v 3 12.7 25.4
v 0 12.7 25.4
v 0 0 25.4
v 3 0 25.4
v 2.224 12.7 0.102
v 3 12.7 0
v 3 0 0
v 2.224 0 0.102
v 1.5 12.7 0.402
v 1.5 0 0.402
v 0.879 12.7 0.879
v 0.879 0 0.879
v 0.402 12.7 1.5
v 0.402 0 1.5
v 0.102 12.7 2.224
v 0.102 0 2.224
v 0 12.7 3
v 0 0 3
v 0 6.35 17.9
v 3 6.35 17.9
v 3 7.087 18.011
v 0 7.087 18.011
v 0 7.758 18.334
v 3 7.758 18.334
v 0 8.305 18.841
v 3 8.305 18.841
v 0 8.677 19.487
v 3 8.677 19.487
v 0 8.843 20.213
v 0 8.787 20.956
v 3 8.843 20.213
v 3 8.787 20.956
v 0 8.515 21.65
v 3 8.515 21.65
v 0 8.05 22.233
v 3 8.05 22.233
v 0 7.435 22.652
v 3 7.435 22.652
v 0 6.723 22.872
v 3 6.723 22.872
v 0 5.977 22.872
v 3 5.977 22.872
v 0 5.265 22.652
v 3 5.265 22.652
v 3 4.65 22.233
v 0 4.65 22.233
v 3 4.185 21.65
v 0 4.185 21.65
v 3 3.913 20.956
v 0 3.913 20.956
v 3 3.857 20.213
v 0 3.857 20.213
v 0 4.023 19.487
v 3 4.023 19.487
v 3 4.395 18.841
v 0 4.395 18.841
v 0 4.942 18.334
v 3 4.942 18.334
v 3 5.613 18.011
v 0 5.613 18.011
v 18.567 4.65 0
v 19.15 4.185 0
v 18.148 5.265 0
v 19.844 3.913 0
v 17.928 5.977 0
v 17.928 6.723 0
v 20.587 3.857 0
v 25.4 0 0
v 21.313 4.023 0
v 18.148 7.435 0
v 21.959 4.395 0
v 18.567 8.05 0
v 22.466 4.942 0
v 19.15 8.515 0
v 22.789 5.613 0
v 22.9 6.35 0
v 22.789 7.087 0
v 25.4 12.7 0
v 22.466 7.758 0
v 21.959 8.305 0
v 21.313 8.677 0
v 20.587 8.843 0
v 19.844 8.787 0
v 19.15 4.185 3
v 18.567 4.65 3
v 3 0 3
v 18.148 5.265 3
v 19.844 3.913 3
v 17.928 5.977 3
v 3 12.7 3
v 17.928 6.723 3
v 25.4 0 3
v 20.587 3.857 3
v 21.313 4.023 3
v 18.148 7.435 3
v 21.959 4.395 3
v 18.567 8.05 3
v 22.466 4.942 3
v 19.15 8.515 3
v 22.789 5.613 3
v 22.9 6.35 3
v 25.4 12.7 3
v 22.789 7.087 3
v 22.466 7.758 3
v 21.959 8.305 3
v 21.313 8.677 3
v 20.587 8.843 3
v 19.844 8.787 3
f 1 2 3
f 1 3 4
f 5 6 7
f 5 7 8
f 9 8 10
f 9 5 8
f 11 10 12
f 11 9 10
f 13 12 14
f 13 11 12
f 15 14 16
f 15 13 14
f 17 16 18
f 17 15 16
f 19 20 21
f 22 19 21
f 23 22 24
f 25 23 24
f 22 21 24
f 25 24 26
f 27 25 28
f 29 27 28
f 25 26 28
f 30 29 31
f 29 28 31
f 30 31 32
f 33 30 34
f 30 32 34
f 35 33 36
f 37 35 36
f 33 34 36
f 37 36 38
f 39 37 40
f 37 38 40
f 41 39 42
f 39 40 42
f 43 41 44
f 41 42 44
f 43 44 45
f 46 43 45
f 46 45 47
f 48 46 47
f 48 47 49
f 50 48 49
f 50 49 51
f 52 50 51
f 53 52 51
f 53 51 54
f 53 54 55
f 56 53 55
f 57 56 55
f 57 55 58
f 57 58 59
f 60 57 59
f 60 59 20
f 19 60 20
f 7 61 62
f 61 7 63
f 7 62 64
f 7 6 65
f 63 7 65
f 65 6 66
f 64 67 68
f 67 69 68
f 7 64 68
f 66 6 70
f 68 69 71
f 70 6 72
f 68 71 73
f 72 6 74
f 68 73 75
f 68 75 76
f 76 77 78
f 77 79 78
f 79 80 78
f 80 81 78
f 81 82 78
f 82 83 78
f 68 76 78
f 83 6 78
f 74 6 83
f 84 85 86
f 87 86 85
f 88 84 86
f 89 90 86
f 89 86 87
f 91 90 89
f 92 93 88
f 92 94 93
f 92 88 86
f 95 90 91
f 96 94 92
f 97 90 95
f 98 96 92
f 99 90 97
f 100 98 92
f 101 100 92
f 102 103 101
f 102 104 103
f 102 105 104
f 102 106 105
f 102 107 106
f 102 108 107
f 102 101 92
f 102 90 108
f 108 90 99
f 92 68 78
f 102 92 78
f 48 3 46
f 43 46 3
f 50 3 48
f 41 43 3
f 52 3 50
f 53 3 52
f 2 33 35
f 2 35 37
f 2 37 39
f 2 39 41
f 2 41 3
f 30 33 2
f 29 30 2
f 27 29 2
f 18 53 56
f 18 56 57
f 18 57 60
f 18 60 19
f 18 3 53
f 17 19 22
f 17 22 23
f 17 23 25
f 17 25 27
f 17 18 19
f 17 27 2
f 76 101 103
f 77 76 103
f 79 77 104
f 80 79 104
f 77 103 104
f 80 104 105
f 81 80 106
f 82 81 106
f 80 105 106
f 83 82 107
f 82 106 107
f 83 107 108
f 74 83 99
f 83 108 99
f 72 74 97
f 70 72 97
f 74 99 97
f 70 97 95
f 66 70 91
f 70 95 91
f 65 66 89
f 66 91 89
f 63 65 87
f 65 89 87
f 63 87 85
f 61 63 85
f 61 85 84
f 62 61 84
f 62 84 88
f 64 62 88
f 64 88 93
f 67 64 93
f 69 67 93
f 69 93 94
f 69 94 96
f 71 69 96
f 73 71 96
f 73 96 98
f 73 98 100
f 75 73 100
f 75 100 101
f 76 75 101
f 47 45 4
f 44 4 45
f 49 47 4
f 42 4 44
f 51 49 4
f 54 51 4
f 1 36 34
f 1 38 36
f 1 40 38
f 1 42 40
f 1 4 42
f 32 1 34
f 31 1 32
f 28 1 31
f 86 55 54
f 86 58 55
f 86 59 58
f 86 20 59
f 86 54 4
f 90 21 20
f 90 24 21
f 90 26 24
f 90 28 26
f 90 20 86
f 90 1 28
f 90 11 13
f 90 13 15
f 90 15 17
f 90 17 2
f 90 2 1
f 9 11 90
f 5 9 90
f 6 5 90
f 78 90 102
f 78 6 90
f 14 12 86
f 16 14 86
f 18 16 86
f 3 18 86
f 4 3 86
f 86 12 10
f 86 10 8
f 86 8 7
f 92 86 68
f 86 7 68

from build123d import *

# Parameters (mm, degrees)
CROQUIS1_W              = 25.4
CROQUIS1_H              = 12.7
SALIENTE_EXTRUIR1_DEPTH = 40
CROQUIS2_W              = 40.869814695
CROQUIS2_H              = 51.393723527
CORTAR_EXTRUIR1_DEPTH   = 30
CROQUIS3_R              = 2.5
CORTAR_EXTRUIR2_DEPTH   = 30
CROQUIS4_R              = 2.5
CORTAR_EXTRUIR3_DEPTH   = 30


with BuildPart() as part:
    # Croquis1 → Saliente-Extruir1 (new body)
    with BuildSketch(Plane.XY):
        with Locations((12.7, 6.35)):
            Rectangle(CROQUIS1_W, CROQUIS1_H)
    extrude(amount=SALIENTE_EXTRUIR1_DEPTH)

    # Croquis2 → Cortar-Extruir1 (cut)
    with BuildSketch(Plane(origin=(0, 12.7, 0), x_dir=(1, 0, 0), z_dir=(0, 1, 0))):
        with Locations((12.097003992, -18.212370052)):
            Rectangle(CROQUIS2_W, CROQUIS2_H)
        with BuildLine():
            Line((25.4, 0), (3, 0))
            ThreePointArc((3, 0), (0.878679656, -0.878679656), (0, -3))
            Line((0, -3), (0, -25.4))
            Line((0, -25.4), (3, -25.4))
            Line((3, -25.4), (3, -3))
            Line((3, -3), (25.4, -3))
            Line((25.4, -3), (25.4, 0))
        make_face(mode=Mode.SUBTRACT)
    extrude(amount=-CORTAR_EXTRUIR1_DEPTH, mode=Mode.SUBTRACT)

    # Croquis3 → Cortar-Extruir2 (cut)
    with BuildSketch(Plane(origin=(3, 0, 0), x_dir=(0, 0, -1), z_dir=(1, 0, 0))):
        with Locations((-20.4, 6.35)):
            Circle(CROQUIS3_R)
    extrude(amount=-CORTAR_EXTRUIR2_DEPTH, mode=Mode.SUBTRACT)

    # Croquis4 → Cortar-Extruir3 (cut)
    with BuildSketch(Plane.XY.offset(3)):
        with Locations((20.4, 6.35)):
            Circle(CROQUIS4_R)
    extrude(amount=-CORTAR_EXTRUIR3_DEPTH, mode=Mode.SUBTRACT)


solid = part.part
